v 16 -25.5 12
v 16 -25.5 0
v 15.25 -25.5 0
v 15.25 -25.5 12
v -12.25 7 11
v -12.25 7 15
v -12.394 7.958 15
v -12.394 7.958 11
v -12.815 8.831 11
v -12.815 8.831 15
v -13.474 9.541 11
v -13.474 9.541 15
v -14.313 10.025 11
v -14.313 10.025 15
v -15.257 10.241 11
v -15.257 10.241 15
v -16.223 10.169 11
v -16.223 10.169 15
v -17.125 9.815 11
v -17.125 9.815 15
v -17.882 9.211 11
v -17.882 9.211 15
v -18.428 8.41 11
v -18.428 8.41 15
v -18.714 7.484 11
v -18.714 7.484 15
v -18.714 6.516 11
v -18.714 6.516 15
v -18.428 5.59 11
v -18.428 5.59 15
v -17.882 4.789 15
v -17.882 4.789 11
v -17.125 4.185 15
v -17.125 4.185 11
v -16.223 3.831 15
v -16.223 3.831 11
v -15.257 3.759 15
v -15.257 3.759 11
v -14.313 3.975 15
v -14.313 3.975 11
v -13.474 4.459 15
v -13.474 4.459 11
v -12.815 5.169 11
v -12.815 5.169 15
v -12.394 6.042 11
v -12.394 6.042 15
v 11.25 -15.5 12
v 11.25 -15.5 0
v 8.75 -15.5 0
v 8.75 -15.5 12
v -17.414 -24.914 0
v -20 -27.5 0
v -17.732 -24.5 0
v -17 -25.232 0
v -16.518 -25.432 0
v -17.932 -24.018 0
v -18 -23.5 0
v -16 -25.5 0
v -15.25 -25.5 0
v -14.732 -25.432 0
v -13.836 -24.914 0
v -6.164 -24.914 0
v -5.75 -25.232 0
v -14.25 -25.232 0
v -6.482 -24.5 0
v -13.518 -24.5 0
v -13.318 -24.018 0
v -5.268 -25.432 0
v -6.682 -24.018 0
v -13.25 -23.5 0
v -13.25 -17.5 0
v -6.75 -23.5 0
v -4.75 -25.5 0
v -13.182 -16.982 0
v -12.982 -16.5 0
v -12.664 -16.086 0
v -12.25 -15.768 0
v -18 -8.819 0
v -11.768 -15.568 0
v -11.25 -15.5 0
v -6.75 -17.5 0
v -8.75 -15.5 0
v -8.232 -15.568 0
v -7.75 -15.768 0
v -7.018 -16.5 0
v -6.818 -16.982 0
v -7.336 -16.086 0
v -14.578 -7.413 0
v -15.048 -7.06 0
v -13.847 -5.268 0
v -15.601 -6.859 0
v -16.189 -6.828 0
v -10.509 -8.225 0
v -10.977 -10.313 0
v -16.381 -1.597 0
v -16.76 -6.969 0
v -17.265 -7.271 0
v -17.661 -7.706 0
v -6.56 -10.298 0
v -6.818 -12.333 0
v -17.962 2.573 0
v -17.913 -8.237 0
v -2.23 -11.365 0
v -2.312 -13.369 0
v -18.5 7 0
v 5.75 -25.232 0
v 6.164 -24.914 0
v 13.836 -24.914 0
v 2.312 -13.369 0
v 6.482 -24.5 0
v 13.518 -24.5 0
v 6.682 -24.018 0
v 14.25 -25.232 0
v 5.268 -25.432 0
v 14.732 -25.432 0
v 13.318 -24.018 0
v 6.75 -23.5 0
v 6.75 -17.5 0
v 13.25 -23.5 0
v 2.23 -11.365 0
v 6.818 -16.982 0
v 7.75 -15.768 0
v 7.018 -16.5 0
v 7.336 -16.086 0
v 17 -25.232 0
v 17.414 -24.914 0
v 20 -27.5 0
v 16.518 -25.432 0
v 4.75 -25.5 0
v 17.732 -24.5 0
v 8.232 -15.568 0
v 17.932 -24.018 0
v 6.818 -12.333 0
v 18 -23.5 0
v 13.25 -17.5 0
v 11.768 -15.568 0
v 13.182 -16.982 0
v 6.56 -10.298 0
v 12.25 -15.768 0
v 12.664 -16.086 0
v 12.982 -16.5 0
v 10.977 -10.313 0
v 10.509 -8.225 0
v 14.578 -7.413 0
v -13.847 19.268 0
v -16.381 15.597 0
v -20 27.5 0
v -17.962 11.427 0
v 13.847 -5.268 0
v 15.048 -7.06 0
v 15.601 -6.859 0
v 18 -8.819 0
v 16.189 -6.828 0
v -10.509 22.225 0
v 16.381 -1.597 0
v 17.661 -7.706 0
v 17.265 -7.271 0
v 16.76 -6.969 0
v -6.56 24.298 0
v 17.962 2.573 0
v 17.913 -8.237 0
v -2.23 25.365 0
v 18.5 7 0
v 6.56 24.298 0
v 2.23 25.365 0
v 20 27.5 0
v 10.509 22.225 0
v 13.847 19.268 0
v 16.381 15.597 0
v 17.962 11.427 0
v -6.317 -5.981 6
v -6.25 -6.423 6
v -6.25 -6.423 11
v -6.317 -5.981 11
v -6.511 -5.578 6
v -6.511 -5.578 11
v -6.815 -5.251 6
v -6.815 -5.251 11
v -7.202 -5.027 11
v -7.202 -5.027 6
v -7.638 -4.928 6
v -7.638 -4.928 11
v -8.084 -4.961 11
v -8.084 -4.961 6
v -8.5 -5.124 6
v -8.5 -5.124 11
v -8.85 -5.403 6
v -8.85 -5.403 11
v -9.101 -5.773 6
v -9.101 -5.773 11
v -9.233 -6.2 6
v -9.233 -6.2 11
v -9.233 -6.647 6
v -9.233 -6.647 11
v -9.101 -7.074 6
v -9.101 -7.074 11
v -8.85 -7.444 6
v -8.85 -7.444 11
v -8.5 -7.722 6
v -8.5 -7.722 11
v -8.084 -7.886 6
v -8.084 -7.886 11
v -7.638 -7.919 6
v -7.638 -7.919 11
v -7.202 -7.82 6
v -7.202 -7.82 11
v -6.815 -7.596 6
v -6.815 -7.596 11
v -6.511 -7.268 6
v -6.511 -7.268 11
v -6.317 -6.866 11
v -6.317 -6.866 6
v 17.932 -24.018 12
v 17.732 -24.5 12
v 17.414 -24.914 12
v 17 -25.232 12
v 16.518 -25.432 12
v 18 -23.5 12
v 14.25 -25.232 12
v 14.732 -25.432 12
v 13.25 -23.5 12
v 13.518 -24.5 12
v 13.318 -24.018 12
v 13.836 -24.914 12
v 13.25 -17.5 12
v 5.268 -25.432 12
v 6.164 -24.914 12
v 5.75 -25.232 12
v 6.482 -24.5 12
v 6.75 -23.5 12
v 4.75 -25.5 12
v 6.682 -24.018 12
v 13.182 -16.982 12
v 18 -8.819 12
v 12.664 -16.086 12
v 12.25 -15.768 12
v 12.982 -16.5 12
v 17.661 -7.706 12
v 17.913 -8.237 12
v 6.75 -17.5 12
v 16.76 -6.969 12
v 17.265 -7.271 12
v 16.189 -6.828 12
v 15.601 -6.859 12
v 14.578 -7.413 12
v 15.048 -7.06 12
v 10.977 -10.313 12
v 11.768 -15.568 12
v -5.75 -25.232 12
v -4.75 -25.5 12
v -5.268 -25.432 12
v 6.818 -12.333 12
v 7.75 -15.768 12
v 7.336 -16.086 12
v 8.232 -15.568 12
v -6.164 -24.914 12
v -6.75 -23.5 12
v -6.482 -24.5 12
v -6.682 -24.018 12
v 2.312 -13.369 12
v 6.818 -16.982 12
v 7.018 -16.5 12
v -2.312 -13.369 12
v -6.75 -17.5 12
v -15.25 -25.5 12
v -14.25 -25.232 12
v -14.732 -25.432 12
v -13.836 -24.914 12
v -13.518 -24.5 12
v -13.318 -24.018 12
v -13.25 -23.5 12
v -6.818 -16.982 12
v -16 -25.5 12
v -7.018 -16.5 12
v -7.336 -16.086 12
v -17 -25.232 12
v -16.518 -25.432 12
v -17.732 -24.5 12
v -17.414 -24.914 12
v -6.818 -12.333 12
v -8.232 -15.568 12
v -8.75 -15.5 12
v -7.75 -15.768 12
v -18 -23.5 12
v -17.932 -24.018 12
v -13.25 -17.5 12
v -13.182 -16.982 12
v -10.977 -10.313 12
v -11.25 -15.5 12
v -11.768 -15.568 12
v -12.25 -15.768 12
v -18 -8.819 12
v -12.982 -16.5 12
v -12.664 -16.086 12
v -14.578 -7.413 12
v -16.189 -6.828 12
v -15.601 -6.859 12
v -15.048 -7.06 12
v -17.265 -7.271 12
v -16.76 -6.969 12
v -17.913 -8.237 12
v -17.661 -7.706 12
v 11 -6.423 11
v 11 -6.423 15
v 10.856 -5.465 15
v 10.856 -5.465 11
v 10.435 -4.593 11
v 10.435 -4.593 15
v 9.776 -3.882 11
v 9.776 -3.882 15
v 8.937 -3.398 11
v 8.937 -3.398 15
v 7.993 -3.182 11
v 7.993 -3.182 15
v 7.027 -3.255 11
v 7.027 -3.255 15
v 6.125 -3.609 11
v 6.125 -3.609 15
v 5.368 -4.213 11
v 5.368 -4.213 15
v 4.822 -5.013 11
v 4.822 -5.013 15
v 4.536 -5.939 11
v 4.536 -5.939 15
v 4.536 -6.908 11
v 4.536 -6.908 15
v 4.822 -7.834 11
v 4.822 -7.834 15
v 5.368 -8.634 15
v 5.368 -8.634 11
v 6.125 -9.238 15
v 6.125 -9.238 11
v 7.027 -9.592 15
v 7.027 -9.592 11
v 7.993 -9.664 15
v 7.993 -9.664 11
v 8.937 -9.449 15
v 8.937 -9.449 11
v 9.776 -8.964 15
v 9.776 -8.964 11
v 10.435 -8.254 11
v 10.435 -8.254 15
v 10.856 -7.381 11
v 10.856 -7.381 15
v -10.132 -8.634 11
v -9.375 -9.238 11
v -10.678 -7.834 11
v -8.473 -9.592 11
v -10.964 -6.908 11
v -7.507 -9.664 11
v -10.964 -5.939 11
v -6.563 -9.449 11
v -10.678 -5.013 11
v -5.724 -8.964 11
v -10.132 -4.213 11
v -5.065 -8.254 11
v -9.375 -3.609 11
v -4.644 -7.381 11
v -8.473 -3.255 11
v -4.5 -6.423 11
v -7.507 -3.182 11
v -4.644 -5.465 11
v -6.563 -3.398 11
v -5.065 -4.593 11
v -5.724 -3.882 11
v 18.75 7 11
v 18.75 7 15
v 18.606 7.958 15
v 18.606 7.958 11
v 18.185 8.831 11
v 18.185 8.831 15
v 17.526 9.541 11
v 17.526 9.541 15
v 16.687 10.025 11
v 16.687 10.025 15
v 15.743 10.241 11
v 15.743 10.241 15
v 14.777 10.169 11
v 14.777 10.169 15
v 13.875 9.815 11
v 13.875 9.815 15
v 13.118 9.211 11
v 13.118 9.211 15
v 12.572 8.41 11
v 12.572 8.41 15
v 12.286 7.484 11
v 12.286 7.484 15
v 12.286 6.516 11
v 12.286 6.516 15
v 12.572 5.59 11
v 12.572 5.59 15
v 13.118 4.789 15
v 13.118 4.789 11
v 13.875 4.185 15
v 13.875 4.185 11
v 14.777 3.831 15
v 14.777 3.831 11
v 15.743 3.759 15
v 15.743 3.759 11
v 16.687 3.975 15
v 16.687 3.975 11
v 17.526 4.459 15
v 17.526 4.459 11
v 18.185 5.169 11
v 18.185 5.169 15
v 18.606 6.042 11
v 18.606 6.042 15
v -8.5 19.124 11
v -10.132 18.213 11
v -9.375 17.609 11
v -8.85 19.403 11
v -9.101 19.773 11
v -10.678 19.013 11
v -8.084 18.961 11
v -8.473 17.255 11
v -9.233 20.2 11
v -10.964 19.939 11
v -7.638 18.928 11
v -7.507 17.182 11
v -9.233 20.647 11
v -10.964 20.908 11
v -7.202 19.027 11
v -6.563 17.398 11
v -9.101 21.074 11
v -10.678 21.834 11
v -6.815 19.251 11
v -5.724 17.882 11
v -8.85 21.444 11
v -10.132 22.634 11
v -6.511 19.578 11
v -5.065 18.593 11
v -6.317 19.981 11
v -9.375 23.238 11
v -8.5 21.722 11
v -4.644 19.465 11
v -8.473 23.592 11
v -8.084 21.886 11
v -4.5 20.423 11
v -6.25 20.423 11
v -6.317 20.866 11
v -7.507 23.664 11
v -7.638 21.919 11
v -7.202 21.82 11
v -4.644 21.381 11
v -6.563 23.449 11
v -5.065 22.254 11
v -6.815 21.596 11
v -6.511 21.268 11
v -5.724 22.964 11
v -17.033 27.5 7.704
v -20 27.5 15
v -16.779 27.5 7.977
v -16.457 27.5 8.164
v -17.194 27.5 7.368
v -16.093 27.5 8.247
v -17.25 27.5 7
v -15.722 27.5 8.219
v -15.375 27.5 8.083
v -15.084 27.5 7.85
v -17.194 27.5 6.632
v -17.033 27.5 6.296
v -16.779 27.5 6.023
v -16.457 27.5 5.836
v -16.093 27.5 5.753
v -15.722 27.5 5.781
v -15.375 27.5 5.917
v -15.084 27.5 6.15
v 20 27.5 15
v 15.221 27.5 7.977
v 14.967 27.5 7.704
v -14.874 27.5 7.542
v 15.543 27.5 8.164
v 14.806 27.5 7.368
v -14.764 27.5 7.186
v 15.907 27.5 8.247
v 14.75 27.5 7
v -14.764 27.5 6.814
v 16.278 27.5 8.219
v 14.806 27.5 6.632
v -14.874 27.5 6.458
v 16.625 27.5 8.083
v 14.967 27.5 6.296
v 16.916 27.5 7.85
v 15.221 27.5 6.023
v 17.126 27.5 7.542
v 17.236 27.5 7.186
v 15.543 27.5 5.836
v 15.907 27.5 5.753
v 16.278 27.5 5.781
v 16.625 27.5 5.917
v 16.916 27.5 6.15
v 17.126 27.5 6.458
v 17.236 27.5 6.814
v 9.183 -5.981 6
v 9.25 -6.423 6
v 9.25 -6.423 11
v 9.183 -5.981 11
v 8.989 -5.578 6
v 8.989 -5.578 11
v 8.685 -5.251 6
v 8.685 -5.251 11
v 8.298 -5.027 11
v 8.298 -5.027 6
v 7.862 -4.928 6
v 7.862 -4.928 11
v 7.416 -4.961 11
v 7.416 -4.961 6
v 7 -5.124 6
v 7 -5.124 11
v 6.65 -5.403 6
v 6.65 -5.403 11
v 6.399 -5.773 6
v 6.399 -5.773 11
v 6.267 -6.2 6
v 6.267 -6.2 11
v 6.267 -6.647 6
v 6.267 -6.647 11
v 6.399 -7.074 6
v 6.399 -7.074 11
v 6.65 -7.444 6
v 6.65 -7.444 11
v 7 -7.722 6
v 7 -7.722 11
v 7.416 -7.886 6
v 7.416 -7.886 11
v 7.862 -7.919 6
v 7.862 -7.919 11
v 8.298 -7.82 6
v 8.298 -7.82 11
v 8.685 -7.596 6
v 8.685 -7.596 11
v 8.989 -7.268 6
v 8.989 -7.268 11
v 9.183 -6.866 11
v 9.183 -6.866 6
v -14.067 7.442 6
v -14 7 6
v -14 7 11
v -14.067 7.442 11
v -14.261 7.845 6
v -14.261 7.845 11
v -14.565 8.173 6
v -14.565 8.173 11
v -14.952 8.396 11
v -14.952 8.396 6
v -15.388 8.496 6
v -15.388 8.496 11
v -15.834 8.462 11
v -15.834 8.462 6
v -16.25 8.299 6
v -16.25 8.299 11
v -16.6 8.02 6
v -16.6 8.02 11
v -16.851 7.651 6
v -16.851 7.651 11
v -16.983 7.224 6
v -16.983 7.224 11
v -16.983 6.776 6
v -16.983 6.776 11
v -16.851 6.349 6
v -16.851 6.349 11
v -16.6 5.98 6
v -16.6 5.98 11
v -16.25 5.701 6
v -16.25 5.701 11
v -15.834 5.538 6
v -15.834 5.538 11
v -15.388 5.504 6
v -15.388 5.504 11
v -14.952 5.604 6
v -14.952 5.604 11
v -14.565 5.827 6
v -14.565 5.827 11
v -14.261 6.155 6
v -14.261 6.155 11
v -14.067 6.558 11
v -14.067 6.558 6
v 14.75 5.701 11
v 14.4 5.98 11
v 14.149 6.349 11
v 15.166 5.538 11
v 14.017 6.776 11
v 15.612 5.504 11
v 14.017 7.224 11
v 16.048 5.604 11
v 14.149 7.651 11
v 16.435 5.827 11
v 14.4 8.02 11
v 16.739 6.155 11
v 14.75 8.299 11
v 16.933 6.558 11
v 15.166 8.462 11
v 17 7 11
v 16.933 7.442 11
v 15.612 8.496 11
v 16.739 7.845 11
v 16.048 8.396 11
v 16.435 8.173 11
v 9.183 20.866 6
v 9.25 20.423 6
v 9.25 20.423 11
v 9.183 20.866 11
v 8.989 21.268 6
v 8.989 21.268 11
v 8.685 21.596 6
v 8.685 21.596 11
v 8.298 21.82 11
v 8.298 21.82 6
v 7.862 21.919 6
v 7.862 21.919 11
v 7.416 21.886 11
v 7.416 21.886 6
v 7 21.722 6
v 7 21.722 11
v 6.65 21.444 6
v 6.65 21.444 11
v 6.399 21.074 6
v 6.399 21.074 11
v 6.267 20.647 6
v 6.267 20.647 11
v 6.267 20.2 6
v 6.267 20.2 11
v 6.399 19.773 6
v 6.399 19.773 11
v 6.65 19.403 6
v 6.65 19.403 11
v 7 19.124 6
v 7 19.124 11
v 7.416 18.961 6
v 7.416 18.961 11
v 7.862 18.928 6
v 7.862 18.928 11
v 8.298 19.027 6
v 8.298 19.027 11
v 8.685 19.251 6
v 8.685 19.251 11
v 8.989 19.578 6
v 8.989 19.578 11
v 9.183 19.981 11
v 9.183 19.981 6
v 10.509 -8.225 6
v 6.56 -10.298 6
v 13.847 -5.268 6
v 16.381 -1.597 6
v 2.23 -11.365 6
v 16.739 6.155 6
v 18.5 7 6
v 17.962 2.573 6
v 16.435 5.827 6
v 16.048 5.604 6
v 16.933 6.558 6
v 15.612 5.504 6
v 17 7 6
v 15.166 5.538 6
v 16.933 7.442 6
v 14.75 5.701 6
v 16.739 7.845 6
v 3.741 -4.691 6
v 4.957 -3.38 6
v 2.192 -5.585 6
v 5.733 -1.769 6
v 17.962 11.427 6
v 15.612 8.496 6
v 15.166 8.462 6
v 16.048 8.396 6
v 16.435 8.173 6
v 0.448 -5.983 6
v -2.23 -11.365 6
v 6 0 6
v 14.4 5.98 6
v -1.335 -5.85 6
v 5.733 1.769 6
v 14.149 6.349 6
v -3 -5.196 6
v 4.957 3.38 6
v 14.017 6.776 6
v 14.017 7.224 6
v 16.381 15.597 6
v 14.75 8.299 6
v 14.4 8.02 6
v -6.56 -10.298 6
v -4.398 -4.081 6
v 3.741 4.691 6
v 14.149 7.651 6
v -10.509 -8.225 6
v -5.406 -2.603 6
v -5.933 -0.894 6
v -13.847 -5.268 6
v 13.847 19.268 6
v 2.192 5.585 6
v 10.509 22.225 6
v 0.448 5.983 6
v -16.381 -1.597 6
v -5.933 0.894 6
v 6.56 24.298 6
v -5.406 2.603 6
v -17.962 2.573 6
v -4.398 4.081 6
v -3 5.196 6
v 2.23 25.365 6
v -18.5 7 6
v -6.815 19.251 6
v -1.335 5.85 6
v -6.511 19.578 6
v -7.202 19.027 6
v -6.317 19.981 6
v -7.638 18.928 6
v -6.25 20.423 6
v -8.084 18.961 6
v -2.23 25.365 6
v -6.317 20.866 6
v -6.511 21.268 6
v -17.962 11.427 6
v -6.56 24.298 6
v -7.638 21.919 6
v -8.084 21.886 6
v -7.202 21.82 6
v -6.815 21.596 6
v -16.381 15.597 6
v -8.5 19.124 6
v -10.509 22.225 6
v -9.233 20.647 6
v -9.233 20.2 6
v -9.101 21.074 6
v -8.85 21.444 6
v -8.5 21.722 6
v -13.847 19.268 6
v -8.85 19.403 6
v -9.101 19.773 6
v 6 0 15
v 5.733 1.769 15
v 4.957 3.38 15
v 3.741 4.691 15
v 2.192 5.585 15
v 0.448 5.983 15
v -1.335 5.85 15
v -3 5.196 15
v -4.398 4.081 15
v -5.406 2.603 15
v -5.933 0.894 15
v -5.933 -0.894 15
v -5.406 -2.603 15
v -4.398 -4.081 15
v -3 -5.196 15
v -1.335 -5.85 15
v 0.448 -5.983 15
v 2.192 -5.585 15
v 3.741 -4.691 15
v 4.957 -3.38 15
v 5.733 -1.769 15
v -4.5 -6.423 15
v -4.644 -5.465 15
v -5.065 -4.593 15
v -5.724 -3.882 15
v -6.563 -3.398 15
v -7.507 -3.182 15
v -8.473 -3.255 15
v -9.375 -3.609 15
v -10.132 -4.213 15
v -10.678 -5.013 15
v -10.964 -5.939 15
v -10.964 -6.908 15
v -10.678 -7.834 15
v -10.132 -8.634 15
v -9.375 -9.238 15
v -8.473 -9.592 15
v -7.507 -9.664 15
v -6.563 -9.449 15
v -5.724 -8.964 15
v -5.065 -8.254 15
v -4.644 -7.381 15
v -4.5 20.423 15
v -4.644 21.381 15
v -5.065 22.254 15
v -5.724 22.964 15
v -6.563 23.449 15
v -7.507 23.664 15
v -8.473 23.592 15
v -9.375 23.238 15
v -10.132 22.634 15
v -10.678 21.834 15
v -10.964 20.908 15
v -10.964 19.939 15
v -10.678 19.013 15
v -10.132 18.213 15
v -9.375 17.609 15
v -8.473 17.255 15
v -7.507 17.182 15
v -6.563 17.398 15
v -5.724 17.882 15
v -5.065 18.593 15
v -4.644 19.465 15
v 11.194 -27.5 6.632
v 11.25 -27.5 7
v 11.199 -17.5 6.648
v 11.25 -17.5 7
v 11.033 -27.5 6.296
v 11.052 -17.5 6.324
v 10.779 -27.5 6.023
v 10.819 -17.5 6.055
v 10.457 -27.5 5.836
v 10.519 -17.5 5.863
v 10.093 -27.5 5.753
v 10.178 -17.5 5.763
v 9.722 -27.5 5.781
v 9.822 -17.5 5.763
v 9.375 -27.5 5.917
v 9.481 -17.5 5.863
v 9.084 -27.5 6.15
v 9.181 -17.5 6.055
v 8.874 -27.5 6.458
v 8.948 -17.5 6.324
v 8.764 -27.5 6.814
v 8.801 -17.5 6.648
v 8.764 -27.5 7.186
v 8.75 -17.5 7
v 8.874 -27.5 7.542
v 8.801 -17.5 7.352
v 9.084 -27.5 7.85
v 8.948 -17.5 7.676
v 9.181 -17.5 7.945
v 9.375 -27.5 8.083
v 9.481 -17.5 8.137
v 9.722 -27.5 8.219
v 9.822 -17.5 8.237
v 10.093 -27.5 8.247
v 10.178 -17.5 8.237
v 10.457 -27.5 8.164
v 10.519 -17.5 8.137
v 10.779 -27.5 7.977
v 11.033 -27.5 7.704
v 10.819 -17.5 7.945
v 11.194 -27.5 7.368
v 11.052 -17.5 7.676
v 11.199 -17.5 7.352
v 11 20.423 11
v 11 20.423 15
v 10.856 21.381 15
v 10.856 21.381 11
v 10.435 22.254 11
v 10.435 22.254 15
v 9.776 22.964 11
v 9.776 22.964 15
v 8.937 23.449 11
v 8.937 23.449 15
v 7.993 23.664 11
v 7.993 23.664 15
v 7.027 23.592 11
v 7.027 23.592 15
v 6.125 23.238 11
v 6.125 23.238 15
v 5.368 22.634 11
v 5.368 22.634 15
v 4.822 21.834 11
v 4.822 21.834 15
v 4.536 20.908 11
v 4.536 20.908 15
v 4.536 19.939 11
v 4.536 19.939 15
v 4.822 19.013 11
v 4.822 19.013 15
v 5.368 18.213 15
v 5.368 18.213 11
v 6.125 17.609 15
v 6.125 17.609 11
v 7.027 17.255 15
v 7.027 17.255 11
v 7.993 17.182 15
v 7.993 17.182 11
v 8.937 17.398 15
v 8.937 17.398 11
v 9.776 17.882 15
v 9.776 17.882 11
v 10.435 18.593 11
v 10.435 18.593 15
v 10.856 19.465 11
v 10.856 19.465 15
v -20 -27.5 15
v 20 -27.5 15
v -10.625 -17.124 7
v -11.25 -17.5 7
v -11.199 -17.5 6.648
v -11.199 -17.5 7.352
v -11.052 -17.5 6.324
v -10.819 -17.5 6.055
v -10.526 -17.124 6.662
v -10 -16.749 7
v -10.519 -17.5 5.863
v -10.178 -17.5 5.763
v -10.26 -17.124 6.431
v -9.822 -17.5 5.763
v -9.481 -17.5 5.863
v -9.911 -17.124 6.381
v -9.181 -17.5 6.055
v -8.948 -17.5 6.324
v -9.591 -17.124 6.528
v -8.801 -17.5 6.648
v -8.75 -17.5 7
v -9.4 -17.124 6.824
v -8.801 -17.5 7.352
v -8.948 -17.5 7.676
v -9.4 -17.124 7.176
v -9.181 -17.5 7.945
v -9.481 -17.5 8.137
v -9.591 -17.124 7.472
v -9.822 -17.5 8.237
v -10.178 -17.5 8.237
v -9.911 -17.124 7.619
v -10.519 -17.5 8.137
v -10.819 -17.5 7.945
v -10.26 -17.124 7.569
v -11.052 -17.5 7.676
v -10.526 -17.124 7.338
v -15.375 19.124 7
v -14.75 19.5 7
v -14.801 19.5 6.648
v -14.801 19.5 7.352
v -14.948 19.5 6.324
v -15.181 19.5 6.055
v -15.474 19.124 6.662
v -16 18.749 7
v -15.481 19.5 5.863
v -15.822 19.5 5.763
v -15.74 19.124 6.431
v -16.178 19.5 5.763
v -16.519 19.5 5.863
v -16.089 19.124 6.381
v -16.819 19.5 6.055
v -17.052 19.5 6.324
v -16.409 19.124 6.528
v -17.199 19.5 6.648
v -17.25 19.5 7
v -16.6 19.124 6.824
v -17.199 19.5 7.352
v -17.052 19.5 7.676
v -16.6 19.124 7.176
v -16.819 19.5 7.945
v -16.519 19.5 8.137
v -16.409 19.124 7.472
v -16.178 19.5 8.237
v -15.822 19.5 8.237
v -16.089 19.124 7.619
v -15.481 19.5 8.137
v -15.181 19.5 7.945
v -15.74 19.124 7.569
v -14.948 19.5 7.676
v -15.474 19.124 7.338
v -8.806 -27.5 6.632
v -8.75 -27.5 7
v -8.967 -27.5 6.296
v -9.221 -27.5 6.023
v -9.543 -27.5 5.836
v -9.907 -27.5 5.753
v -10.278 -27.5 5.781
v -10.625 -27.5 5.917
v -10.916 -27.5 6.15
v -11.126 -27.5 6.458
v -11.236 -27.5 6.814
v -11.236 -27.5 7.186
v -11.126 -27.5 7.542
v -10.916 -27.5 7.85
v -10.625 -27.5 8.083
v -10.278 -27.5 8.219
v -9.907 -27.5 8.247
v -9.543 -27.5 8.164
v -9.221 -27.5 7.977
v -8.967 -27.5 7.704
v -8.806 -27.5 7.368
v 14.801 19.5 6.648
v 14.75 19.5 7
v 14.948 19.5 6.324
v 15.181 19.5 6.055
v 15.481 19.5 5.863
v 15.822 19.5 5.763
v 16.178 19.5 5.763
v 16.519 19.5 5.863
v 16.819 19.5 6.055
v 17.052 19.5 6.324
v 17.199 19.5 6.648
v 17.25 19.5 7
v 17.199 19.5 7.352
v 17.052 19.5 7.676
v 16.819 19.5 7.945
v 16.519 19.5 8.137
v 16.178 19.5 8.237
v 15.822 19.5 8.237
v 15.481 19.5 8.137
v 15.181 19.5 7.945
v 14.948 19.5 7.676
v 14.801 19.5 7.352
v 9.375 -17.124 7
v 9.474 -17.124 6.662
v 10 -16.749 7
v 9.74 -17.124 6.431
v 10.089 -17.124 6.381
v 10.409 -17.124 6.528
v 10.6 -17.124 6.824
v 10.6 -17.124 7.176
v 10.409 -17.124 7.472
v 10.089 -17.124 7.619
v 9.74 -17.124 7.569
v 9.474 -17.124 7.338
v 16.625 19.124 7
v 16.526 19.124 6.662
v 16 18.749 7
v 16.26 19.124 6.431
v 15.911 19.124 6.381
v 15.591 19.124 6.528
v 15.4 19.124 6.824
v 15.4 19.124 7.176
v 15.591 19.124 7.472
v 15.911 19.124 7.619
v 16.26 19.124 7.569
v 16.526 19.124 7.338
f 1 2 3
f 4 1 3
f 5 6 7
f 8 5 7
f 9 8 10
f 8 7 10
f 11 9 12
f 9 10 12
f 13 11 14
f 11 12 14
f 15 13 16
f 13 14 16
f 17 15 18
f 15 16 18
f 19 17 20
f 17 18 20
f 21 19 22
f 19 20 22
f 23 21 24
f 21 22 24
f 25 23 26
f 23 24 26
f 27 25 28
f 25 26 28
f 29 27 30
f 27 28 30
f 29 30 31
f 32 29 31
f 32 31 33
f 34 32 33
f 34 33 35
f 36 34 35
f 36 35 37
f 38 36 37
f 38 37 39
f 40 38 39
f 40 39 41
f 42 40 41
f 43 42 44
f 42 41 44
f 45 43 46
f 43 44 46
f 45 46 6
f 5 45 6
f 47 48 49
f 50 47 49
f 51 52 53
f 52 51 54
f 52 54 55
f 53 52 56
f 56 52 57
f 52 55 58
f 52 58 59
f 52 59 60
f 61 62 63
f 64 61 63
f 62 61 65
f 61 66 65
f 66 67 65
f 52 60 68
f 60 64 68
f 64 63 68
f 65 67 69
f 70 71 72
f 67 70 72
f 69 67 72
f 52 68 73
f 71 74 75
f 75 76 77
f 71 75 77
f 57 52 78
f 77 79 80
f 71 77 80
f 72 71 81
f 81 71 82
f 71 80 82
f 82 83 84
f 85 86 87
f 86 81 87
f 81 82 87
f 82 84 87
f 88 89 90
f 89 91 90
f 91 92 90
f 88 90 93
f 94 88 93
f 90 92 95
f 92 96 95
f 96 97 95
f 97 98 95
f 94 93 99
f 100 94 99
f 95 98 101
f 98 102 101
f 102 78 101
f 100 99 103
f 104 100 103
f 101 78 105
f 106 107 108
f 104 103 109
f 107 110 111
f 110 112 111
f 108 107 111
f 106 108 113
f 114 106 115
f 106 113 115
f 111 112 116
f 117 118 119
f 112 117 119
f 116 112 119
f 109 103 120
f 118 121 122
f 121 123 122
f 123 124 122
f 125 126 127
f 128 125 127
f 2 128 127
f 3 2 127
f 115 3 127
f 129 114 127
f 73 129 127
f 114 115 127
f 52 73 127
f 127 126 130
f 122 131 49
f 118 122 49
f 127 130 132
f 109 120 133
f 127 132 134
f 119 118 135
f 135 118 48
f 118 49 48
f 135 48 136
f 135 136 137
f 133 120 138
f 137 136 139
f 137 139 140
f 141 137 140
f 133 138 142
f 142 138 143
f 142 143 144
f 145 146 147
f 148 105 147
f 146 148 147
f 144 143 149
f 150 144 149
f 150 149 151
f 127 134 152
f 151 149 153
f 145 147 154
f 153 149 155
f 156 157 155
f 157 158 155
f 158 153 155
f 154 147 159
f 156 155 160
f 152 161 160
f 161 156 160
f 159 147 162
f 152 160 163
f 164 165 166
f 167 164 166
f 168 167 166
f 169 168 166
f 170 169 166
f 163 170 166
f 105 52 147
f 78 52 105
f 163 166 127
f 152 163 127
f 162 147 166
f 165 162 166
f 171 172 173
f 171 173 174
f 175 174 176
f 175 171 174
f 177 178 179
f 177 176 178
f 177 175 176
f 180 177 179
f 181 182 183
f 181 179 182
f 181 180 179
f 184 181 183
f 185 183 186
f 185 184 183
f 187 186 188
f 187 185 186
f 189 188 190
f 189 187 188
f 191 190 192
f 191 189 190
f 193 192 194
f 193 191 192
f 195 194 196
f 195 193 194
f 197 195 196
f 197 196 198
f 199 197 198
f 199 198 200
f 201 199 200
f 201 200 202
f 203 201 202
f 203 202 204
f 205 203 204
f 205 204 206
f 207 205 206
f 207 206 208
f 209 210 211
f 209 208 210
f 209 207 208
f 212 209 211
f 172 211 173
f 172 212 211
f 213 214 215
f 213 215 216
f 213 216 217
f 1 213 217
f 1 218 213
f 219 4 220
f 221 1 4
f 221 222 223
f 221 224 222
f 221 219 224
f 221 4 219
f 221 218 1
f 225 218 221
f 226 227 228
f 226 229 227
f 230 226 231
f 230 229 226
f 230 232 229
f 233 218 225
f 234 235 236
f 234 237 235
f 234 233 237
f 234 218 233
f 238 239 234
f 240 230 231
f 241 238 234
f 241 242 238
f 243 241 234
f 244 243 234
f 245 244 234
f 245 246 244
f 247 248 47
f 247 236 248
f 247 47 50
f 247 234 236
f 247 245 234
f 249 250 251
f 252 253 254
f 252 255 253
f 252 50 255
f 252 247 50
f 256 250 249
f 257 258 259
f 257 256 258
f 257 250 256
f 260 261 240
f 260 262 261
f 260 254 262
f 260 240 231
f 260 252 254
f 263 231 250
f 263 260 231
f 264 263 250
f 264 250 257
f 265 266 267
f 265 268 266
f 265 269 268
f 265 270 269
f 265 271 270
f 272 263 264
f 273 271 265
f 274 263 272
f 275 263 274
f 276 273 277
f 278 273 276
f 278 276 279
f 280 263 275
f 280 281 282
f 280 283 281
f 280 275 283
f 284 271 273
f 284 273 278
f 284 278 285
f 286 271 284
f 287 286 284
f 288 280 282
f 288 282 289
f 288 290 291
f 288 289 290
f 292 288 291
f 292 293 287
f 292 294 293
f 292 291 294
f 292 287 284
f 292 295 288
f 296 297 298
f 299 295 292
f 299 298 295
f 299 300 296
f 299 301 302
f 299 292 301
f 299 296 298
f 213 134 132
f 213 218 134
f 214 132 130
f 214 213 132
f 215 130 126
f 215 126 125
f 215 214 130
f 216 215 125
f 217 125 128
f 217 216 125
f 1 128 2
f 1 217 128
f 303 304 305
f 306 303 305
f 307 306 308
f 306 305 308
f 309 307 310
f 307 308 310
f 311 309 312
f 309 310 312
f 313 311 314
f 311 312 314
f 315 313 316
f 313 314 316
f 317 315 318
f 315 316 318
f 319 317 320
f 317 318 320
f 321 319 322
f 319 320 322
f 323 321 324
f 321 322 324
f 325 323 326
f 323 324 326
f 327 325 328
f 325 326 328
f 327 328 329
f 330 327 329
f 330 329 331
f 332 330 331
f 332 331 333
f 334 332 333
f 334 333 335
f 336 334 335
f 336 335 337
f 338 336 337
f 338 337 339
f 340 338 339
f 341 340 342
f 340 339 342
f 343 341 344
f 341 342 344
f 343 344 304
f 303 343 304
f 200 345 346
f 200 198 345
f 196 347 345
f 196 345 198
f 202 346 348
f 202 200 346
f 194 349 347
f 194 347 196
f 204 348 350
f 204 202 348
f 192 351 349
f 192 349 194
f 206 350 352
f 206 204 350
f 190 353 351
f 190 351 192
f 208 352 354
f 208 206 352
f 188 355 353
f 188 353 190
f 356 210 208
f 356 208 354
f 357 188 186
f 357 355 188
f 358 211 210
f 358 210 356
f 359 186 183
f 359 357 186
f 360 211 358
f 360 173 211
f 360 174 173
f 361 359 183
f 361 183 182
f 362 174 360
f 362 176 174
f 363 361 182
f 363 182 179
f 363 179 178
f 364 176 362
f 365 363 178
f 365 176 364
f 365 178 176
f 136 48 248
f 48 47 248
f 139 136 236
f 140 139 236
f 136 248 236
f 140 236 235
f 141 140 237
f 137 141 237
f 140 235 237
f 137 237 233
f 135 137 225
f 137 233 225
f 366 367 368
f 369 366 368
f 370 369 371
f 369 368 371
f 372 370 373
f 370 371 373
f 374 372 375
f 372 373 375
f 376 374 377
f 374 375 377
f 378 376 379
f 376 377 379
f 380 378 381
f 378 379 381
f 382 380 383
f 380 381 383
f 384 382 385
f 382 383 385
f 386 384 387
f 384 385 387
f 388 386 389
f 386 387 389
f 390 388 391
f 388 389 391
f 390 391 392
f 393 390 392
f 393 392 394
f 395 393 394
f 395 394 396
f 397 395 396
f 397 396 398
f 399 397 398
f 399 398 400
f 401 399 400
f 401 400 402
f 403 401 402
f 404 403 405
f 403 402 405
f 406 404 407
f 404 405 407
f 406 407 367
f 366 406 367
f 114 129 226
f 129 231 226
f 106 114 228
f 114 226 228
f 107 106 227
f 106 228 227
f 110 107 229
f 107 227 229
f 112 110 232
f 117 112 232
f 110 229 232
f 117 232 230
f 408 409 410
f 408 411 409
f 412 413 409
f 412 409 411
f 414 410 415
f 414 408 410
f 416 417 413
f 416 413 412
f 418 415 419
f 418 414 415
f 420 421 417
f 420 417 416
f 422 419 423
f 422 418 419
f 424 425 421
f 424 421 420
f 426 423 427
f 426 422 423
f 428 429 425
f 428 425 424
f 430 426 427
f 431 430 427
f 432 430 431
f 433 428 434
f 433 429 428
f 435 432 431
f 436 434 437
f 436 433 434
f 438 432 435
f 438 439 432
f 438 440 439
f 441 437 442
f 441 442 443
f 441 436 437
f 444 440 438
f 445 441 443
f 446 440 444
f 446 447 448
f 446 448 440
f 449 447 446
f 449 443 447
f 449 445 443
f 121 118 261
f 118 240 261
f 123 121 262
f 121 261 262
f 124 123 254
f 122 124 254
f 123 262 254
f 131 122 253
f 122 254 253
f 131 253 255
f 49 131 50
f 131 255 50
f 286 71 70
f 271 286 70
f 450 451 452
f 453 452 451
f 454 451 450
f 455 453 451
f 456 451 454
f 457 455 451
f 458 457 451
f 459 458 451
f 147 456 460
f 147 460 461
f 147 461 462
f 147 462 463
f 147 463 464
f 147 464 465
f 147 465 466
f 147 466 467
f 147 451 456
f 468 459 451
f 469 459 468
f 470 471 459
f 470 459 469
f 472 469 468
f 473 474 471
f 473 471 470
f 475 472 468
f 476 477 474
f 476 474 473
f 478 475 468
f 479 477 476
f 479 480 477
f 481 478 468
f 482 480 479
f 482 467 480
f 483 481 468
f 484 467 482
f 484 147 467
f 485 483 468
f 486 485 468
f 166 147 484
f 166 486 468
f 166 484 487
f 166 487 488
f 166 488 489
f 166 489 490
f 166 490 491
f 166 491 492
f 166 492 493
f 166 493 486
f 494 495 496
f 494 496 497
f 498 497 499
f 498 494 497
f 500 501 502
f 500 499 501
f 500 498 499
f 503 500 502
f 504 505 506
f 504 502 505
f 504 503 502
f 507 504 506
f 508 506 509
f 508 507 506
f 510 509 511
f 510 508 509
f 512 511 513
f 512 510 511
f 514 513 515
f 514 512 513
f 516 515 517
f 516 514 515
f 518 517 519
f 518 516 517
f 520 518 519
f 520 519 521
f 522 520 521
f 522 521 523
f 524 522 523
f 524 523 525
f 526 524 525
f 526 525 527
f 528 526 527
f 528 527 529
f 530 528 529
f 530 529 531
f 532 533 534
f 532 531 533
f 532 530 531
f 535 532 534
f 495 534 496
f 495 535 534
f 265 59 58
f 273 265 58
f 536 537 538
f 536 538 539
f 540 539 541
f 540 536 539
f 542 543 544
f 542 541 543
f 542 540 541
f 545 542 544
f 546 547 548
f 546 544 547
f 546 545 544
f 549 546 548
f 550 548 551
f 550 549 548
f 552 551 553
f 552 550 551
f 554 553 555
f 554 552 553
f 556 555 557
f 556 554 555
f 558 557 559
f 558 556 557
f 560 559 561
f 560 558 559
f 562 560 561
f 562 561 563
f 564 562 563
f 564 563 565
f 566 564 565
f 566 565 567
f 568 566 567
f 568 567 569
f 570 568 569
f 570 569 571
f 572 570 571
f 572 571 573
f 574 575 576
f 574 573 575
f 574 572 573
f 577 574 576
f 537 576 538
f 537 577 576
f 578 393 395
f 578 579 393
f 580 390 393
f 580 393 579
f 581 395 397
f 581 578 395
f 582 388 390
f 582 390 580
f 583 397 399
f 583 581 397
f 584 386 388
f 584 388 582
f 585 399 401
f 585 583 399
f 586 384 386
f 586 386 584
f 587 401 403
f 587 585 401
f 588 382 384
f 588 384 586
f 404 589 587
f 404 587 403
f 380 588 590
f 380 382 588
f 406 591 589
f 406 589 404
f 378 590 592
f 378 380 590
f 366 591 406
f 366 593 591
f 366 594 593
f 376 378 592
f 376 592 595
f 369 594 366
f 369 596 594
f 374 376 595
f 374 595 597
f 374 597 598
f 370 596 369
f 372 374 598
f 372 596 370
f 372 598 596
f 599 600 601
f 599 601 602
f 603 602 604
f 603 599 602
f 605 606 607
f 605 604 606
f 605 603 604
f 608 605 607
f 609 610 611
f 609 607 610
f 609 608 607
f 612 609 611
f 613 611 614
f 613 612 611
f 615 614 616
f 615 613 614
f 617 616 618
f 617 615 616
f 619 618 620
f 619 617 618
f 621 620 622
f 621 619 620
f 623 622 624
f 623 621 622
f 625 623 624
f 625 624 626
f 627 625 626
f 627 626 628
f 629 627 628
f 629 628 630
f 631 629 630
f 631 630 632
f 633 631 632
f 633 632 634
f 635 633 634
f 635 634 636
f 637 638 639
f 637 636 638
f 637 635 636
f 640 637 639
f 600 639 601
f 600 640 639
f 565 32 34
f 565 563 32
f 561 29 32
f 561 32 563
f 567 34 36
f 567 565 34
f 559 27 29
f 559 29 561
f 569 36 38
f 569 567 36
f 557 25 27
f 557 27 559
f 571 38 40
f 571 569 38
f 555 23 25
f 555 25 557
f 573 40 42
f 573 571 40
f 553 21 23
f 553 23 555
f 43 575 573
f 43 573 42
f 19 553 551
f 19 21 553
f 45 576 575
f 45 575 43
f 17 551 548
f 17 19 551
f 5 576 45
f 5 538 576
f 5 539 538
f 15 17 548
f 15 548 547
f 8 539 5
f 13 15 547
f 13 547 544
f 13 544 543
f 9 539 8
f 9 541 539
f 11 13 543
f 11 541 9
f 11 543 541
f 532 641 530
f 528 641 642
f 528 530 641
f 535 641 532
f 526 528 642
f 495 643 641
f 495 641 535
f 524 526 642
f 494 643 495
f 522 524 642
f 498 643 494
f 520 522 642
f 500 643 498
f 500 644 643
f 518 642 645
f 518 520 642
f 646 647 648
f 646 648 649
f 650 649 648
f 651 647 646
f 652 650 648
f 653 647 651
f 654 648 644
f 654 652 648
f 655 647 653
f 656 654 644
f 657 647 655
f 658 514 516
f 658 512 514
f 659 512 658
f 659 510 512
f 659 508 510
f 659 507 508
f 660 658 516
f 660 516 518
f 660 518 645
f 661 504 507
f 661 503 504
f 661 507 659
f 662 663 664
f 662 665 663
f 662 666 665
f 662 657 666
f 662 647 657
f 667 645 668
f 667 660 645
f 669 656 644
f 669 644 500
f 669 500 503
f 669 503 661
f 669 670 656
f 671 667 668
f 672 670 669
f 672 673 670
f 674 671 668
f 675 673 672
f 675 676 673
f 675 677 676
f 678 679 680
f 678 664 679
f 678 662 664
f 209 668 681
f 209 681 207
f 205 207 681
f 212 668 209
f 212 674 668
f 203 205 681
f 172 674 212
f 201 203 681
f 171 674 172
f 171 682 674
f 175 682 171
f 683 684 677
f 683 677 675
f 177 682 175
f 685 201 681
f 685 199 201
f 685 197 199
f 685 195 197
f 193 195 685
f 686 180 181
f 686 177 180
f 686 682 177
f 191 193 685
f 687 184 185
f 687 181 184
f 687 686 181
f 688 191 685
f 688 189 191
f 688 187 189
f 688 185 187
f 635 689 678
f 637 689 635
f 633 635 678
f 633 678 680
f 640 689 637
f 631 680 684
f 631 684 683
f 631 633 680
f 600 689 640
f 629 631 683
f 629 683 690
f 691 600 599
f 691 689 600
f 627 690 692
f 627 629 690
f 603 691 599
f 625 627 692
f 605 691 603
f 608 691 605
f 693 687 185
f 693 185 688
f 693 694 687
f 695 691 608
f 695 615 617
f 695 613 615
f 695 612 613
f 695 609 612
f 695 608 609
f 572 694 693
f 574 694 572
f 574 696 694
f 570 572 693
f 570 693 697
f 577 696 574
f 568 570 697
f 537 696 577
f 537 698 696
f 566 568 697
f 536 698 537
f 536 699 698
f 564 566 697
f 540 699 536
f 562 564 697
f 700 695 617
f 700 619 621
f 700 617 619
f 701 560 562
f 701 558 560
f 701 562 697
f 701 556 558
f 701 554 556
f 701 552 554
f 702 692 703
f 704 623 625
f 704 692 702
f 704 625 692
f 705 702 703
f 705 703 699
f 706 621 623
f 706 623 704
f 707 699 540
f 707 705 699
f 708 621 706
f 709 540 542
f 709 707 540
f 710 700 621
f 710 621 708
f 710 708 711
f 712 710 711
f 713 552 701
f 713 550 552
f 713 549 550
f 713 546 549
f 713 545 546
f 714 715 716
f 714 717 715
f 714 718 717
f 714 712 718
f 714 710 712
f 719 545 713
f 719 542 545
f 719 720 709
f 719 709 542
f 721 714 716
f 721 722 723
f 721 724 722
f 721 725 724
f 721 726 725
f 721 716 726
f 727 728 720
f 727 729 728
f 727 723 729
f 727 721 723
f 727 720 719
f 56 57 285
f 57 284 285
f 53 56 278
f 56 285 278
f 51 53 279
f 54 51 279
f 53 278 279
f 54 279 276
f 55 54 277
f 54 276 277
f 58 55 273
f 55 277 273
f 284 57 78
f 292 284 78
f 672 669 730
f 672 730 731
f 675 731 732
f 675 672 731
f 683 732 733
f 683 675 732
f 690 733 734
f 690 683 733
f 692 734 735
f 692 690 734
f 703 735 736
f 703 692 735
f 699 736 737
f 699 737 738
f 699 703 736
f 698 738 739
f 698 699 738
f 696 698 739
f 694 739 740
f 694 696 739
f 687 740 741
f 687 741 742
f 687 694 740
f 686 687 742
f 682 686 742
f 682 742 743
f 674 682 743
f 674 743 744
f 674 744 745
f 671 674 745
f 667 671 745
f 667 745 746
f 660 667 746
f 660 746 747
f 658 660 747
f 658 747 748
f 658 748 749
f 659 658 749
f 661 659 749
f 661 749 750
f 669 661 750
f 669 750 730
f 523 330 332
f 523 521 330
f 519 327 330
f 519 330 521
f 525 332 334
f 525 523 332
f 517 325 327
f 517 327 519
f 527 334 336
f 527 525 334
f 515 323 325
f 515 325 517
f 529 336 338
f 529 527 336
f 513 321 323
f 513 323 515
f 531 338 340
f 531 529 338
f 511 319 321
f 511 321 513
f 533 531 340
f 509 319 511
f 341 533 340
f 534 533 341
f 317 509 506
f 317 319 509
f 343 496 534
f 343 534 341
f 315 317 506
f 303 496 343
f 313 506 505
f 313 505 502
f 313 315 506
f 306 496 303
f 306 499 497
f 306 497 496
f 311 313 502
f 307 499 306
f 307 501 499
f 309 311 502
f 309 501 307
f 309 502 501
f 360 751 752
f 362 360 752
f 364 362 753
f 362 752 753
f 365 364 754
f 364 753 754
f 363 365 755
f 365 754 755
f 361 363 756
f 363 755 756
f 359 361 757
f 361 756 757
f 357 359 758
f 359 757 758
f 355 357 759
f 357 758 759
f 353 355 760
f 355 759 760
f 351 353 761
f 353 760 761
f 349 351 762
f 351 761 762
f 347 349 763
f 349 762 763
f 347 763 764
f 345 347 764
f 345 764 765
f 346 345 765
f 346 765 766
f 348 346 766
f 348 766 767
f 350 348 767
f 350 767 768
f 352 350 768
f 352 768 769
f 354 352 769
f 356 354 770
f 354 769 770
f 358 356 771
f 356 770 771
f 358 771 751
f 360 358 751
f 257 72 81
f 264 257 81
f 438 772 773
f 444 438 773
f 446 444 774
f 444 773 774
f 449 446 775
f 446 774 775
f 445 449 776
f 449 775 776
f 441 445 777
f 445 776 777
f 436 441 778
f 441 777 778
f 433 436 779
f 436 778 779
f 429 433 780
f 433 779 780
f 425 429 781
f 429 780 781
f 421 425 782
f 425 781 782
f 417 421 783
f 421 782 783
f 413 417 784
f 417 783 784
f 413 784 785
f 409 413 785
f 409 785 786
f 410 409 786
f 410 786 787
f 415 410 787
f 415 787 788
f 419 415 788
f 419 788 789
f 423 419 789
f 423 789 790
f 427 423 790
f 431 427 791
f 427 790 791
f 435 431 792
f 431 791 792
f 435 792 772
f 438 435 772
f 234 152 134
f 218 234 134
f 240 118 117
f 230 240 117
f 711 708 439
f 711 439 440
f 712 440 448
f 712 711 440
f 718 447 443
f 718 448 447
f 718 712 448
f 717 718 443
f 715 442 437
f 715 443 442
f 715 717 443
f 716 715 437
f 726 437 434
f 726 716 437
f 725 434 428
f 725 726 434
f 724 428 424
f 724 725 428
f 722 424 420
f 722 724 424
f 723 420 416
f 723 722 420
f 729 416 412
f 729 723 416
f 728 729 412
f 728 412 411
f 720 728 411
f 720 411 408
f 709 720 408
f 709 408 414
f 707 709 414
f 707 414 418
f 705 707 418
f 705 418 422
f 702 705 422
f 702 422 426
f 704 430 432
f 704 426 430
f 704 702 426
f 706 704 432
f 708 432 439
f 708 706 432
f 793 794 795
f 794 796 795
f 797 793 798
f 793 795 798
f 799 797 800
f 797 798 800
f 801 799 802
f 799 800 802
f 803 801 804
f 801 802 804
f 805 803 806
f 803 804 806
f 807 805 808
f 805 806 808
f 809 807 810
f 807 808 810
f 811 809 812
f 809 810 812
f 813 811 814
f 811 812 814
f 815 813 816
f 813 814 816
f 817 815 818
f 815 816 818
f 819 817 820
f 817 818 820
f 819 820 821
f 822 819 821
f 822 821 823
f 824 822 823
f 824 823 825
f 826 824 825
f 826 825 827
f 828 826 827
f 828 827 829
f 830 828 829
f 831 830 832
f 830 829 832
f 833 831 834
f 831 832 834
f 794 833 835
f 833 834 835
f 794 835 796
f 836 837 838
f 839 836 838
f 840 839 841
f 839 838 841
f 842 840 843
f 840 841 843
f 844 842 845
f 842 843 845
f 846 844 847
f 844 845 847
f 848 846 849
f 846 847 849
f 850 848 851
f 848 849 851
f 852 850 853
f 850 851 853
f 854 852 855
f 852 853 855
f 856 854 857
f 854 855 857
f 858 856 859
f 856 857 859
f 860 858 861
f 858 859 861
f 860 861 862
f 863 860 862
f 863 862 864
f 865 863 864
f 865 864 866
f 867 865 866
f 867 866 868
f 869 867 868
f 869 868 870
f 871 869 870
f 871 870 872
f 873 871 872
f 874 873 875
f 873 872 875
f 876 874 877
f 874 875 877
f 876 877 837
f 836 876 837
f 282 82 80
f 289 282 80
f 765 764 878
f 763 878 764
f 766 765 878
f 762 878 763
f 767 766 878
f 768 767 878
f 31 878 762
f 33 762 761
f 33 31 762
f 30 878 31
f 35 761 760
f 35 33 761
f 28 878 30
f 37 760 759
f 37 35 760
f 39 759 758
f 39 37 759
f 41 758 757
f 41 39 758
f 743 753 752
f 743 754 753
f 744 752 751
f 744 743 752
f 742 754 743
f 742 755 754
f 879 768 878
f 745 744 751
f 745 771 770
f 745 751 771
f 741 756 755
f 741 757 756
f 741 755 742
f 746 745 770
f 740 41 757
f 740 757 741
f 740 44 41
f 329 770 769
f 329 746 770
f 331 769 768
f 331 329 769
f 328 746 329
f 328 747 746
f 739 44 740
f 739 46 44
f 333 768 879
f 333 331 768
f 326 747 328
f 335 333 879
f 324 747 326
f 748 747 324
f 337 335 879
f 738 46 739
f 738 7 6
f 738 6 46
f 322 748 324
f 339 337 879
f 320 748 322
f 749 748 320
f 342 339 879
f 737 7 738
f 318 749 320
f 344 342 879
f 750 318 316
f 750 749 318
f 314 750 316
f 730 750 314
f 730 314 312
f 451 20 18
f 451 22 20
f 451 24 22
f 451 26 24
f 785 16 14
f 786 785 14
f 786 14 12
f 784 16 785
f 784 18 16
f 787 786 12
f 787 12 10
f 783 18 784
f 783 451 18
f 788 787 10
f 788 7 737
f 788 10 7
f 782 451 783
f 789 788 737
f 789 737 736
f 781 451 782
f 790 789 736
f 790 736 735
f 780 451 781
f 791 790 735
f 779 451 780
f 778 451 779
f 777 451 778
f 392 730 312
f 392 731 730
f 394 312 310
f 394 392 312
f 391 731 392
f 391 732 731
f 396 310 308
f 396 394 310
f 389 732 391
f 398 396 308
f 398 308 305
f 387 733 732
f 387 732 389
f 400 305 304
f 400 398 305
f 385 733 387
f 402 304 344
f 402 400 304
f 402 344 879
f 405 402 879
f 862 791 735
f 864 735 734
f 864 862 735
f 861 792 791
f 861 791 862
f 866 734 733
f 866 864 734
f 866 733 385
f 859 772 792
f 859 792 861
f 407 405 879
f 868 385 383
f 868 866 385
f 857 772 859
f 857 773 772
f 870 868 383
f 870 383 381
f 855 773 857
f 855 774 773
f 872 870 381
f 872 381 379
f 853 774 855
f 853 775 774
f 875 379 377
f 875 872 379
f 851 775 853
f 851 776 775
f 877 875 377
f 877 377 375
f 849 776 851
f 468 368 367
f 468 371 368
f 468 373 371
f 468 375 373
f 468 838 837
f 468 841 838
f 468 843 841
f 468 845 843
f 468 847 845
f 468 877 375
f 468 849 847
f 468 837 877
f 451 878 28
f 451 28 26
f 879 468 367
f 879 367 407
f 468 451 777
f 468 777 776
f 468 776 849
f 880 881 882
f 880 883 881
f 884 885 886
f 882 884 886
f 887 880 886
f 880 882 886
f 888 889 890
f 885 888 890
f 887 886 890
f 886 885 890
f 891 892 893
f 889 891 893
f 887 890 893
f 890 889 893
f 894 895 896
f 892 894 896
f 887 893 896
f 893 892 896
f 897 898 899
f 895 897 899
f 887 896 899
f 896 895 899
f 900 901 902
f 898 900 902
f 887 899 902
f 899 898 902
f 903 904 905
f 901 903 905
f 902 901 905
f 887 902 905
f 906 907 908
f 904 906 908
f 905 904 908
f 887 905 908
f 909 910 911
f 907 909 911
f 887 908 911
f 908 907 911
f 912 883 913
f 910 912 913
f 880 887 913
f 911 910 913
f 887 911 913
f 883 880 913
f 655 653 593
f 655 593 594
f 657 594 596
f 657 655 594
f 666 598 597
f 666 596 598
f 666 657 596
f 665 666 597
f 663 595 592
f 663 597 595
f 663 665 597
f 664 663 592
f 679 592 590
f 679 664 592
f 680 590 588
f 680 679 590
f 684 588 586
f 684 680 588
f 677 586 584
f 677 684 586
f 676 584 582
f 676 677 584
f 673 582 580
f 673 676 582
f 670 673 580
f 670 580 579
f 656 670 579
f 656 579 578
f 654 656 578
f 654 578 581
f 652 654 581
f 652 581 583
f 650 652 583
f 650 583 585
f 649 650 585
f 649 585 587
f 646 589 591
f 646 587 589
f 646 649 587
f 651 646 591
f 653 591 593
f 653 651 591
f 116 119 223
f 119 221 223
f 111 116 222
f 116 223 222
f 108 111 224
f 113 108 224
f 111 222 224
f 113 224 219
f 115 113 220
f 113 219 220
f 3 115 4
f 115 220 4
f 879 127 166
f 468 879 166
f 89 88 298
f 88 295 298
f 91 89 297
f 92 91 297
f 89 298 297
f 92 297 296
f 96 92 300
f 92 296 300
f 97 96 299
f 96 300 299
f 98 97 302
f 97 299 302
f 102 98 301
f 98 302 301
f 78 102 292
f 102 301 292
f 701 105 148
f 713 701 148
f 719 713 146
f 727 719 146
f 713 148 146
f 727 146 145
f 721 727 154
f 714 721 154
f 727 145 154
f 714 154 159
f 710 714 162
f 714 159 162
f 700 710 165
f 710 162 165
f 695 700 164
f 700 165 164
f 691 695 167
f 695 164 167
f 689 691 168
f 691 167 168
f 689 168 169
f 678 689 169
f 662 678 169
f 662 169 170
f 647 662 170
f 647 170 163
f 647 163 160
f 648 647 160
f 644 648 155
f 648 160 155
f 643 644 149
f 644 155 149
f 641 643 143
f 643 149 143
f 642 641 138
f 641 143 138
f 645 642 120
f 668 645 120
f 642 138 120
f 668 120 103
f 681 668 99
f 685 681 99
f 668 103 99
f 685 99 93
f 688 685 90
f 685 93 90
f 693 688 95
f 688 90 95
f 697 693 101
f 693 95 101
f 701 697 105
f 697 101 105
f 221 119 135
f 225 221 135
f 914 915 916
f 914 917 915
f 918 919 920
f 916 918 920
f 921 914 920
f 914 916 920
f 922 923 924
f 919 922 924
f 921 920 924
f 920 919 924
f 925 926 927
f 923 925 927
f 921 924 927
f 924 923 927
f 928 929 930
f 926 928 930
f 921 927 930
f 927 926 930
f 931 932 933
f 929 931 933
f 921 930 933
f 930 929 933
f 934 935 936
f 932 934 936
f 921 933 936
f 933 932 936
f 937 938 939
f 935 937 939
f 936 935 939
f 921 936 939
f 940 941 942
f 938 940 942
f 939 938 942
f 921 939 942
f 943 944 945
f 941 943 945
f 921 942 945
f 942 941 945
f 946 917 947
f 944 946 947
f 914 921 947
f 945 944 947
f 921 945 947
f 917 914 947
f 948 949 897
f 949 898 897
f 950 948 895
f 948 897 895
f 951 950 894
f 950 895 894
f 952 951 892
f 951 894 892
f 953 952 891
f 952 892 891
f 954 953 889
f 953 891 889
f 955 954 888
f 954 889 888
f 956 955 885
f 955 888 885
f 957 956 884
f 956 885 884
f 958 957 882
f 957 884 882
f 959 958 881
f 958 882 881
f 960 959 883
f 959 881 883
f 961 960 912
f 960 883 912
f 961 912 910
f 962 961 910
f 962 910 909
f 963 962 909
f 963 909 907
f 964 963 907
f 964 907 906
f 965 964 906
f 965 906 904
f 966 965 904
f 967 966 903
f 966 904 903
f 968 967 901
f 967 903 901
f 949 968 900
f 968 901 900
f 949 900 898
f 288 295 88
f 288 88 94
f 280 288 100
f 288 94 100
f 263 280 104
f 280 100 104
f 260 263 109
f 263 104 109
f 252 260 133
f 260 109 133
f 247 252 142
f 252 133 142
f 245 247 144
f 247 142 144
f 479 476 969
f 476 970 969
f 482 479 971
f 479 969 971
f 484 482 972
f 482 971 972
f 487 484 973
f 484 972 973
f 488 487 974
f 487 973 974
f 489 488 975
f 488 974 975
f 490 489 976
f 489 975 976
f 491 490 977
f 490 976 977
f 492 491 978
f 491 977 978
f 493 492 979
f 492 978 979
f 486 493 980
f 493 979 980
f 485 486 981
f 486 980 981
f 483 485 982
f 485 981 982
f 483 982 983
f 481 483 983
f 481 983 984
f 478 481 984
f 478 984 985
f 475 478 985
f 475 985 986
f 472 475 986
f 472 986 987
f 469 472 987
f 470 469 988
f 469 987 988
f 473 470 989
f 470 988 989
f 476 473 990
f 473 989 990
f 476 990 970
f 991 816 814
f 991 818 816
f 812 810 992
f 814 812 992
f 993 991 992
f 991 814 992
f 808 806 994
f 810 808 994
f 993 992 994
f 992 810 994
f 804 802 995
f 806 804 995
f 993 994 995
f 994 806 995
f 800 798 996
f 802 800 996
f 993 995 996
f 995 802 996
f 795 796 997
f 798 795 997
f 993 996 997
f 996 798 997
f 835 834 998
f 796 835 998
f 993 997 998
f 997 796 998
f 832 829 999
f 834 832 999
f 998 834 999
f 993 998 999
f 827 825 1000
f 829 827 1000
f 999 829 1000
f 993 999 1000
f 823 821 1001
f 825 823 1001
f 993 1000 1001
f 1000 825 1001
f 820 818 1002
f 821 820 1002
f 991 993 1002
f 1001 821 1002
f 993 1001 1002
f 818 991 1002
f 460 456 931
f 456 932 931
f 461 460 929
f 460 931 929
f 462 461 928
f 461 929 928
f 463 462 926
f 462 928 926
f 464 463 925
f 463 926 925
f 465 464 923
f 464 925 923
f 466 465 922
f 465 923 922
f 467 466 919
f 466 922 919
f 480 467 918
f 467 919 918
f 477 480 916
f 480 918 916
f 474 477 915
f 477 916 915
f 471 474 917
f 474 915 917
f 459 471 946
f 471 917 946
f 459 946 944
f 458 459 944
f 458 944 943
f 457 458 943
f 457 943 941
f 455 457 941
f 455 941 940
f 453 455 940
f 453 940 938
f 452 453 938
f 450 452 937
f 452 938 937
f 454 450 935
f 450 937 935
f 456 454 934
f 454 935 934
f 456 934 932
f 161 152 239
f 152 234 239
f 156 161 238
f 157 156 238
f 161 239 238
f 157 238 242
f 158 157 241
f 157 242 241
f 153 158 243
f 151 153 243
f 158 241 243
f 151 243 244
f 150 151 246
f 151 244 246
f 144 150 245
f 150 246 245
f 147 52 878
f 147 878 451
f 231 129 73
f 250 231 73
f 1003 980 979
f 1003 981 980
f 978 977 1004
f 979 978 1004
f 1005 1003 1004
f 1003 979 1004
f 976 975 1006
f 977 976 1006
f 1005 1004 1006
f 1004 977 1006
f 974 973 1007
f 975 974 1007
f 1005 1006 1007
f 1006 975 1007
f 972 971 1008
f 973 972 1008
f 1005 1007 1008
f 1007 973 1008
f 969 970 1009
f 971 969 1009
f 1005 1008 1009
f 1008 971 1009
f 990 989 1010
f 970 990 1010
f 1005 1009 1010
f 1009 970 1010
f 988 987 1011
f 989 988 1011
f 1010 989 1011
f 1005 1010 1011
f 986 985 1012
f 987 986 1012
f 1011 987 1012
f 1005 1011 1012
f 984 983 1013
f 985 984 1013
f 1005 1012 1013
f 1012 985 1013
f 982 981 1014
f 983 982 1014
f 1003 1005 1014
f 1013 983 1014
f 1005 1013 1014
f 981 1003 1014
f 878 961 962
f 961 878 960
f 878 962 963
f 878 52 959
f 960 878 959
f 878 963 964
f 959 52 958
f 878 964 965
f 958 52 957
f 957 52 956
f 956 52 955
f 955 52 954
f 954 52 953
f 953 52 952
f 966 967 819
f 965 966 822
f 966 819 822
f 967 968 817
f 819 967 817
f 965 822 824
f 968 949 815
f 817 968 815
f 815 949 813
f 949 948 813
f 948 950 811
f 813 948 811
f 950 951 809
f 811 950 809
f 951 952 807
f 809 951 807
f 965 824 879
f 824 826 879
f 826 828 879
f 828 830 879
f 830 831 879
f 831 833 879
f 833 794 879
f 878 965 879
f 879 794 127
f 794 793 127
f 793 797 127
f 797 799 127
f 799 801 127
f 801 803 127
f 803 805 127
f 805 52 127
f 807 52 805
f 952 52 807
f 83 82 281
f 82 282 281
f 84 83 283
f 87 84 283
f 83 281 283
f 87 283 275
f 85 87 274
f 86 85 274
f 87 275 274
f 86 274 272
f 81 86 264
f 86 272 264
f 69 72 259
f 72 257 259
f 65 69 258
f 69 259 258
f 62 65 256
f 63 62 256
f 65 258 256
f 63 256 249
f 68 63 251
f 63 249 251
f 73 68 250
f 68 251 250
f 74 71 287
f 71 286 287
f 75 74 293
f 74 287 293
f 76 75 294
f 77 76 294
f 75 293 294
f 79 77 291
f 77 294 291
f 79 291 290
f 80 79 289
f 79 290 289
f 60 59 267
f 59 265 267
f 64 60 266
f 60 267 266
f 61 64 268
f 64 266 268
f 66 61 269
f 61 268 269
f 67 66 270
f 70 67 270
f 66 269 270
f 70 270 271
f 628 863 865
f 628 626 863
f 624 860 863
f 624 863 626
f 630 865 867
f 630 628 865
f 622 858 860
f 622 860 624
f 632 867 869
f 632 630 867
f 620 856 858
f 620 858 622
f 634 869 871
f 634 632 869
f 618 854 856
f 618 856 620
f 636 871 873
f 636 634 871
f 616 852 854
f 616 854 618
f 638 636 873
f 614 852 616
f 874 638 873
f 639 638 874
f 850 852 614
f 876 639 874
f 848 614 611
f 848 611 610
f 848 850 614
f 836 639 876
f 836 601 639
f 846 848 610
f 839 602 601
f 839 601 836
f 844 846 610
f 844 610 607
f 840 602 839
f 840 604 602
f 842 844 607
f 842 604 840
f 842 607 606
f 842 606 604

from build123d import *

# Parameters (mm, degrees)
SKETCH1_W             = 40
SKETCH1_H             = 55
SKETCH1_R             = 6
SKETCH1_R_2           = 1.5
BOSS_EXTRUDE1_DEPTH   = 15
SKETCH2_R             = 18.5
CUT_EXTRUDE1_DEPTH    = 6
M3_TAPPED_HOLE1_D     = 2.5
M3_TAPPED_HOLE1_DEPTH = 10
M3_TAPPED_HOLE1_TIP   = 0.751075774
M3_TAPPED_HOLE2_D     = 2.5
M3_TAPPED_HOLE2_DEPTH = 8
M3_TAPPED_HOLE2_TIP   = 0.751075774
SKETCH7_R             = 3.25
CUT_EXTRUDE2_DEPTH    = 4
CUT_EXTRUDE3_DEPTH    = 12
FILLET1_R             = 2
SKETCH10_W            = 3
SKETCH10_H            = 48
BOSS_EXTRUDE2_DEPTH   = 15


with BuildPart() as part:
    # Sketch1 → Boss-Extrude1 (new body)
    with BuildSketch(Plane.XY):
        Rectangle(SKETCH1_W, SKETCH1_H)
        Circle(SKETCH1_R, mode=Mode.SUBTRACT)
        with Locations((15.5, 7)):
            Circle(SKETCH1_R_2, mode=Mode.SUBTRACT)
        with Locations((7.75, -6.423393759)):
            Circle(SKETCH1_R_2, mode=Mode.SUBTRACT)
        with Locations((-7.75, -6.423393759)):
            Circle(SKETCH1_R_2, mode=Mode.SUBTRACT)
        with Locations((-15.5, 7)):
            Circle(SKETCH1_R_2, mode=Mode.SUBTRACT)
        with Locations((-7.75, 20.423393759)):
            Circle(SKETCH1_R_2, mode=Mode.SUBTRACT)
        with Locations((7.75, 20.423393759)):
            Circle(SKETCH1_R_2, mode=Mode.SUBTRACT)
    extrude(amount=BOSS_EXTRUDE1_DEPTH)

    # Sketch2 → Cut-Extrude1 (cut)
    with BuildSketch(Plane(origin=(0, 0, 0), x_dir=(-1, 0, 0), z_dir=(0, 0, -1))):
        with Locations((0, 7)):
            Circle(SKETCH2_R)
    extrude(amount=-CUT_EXTRUDE1_DEPTH, mode=Mode.SUBTRACT)

    # M3 Tapped Hole1
    with Locations(Plane(origin=(0, -27.5, 0), x_dir=(-1, 0, 0), z_dir=(0, -1, 0))):
        with Locations((-10, -7), (10, -7)):
            Hole(M3_TAPPED_HOLE1_D / 2, depth=M3_TAPPED_HOLE1_DEPTH)
            with Locations((0, 0, -(M3_TAPPED_HOLE1_DEPTH + M3_TAPPED_HOLE1_TIP / 2))):  # 118° drill point
                Cone(0, M3_TAPPED_HOLE1_D / 2, M3_TAPPED_HOLE1_TIP, mode=Mode.SUBTRACT)

    # M3 Tapped Hole2
    with Locations(Plane(origin=(0, 27.5, 0), x_dir=(1, 0, 0), z_dir=(0, 1, 0))):
        with Locations((-16, -7), (16, -7)):
            Hole(M3_TAPPED_HOLE2_D / 2, depth=M3_TAPPED_HOLE2_DEPTH)
            with Locations((0, 0, -(M3_TAPPED_HOLE2_DEPTH + M3_TAPPED_HOLE2_TIP / 2))):  # 118° drill point
                Cone(0, M3_TAPPED_HOLE2_D / 2, M3_TAPPED_HOLE2_TIP, mode=Mode.SUBTRACT)

    # Sketch7 → Cut-Extrude2 (cut)
    with BuildSketch(Plane.XY.offset(15)):
        with Locations((-7.75, 20.423393759)):
            Circle(SKETCH7_R)
        with Locations((7.75, 20.423393759)):
            Circle(SKETCH7_R)
        with Locations((15.5, 7)):
            Circle(SKETCH7_R)
        with Locations((7.75, -6.423393759)):
            Circle(SKETCH7_R)
        with Locations((-7.75, -6.423393759)):
            Circle(SKETCH7_R)
        with Locations((-15.5, 7)):
            Circle(SKETCH7_R)
    extrude(amount=-CUT_EXTRUDE2_DEPTH, mode=Mode.SUBTRACT)

    # Sketch9 → Cut-Extrude3 (cut)
    with BuildSketch(Plane(origin=(0, 0, 0), x_dir=(-1, 0, 0), z_dir=(0, 0, -1))):
        with BuildLine():
            Line((-18, -25.5), (-13.25, -25.5))
            Line((-13.25, -25.5), (-13.25, -15.5))
            Line((-13.25, -15.5), (-6.75, -15.5))
            Line((-6.75, -15.5), (-6.75, -25.5))
            Line((-6.75, -25.5), (6.75, -25.5))
            Line((6.75, -25.5), (6.75, -15.5))
            Line((6.75, -15.5), (13.25, -15.5))
            Line((13.25, -15.5), (13.25, -25.5))
            Line((13.25, -25.5), (18, -25.5))
            Line((18, -25.5), (18, -2.810708435))
            ThreePointArc((18, -2.810708435), (0, -13.5), (-18, -2.810708435))
            Line((-18, -2.810708435), (-18, -25.5))
        make_face()
    extrude(amount=-CUT_EXTRUDE3_DEPTH, mode=Mode.SUBTRACT)

    # Fillet1
    fillet1_edges = [part.edges().sort_by_distance(p)[0] for p in [
        (18, -25.5, 6),
        (18, -2.810708435, 6),
        (-18, -2.810708435, 6),
        (-18, -25.5, 6),
        (-13.25, -25.5, 6),
        (-13.25, -15.5, 6),
        (-6.75, -15.5, 6),
        (-6.75, -25.5, 6),
        (6.75, -25.5, 6),
        (6.75, -15.5, 6),
        (13.25, -15.5, 6),
        (13.25, -25.5, 6),
    ]]
    fillet(fillet1_edges, radius=FILLET1_R)

    # Sketch10 → Boss-Extrude2 (add)
    with BuildSketch(Plane.XY.offset(15)):
        with Locations((-21.5, 3.5)):
            Rectangle(SKETCH10_W, SKETCH10_H)
        with Locations((21.5, 3.5)):
            Rectangle(SKETCH10_W, SKETCH10_H)
    extrude(amount=BOSS_EXTRUDE2_DEPTH)


with BuildPart() as boss_extrude2_kept_piece:
    # of the separate pieces the step leaves, the one the design keeps (boss_extrude2_pieces_kept)
    add(part.part.solids().sort_by_distance((18, -8.81929202, 0))[0])


solid = boss_extrude2_kept_piece.part
